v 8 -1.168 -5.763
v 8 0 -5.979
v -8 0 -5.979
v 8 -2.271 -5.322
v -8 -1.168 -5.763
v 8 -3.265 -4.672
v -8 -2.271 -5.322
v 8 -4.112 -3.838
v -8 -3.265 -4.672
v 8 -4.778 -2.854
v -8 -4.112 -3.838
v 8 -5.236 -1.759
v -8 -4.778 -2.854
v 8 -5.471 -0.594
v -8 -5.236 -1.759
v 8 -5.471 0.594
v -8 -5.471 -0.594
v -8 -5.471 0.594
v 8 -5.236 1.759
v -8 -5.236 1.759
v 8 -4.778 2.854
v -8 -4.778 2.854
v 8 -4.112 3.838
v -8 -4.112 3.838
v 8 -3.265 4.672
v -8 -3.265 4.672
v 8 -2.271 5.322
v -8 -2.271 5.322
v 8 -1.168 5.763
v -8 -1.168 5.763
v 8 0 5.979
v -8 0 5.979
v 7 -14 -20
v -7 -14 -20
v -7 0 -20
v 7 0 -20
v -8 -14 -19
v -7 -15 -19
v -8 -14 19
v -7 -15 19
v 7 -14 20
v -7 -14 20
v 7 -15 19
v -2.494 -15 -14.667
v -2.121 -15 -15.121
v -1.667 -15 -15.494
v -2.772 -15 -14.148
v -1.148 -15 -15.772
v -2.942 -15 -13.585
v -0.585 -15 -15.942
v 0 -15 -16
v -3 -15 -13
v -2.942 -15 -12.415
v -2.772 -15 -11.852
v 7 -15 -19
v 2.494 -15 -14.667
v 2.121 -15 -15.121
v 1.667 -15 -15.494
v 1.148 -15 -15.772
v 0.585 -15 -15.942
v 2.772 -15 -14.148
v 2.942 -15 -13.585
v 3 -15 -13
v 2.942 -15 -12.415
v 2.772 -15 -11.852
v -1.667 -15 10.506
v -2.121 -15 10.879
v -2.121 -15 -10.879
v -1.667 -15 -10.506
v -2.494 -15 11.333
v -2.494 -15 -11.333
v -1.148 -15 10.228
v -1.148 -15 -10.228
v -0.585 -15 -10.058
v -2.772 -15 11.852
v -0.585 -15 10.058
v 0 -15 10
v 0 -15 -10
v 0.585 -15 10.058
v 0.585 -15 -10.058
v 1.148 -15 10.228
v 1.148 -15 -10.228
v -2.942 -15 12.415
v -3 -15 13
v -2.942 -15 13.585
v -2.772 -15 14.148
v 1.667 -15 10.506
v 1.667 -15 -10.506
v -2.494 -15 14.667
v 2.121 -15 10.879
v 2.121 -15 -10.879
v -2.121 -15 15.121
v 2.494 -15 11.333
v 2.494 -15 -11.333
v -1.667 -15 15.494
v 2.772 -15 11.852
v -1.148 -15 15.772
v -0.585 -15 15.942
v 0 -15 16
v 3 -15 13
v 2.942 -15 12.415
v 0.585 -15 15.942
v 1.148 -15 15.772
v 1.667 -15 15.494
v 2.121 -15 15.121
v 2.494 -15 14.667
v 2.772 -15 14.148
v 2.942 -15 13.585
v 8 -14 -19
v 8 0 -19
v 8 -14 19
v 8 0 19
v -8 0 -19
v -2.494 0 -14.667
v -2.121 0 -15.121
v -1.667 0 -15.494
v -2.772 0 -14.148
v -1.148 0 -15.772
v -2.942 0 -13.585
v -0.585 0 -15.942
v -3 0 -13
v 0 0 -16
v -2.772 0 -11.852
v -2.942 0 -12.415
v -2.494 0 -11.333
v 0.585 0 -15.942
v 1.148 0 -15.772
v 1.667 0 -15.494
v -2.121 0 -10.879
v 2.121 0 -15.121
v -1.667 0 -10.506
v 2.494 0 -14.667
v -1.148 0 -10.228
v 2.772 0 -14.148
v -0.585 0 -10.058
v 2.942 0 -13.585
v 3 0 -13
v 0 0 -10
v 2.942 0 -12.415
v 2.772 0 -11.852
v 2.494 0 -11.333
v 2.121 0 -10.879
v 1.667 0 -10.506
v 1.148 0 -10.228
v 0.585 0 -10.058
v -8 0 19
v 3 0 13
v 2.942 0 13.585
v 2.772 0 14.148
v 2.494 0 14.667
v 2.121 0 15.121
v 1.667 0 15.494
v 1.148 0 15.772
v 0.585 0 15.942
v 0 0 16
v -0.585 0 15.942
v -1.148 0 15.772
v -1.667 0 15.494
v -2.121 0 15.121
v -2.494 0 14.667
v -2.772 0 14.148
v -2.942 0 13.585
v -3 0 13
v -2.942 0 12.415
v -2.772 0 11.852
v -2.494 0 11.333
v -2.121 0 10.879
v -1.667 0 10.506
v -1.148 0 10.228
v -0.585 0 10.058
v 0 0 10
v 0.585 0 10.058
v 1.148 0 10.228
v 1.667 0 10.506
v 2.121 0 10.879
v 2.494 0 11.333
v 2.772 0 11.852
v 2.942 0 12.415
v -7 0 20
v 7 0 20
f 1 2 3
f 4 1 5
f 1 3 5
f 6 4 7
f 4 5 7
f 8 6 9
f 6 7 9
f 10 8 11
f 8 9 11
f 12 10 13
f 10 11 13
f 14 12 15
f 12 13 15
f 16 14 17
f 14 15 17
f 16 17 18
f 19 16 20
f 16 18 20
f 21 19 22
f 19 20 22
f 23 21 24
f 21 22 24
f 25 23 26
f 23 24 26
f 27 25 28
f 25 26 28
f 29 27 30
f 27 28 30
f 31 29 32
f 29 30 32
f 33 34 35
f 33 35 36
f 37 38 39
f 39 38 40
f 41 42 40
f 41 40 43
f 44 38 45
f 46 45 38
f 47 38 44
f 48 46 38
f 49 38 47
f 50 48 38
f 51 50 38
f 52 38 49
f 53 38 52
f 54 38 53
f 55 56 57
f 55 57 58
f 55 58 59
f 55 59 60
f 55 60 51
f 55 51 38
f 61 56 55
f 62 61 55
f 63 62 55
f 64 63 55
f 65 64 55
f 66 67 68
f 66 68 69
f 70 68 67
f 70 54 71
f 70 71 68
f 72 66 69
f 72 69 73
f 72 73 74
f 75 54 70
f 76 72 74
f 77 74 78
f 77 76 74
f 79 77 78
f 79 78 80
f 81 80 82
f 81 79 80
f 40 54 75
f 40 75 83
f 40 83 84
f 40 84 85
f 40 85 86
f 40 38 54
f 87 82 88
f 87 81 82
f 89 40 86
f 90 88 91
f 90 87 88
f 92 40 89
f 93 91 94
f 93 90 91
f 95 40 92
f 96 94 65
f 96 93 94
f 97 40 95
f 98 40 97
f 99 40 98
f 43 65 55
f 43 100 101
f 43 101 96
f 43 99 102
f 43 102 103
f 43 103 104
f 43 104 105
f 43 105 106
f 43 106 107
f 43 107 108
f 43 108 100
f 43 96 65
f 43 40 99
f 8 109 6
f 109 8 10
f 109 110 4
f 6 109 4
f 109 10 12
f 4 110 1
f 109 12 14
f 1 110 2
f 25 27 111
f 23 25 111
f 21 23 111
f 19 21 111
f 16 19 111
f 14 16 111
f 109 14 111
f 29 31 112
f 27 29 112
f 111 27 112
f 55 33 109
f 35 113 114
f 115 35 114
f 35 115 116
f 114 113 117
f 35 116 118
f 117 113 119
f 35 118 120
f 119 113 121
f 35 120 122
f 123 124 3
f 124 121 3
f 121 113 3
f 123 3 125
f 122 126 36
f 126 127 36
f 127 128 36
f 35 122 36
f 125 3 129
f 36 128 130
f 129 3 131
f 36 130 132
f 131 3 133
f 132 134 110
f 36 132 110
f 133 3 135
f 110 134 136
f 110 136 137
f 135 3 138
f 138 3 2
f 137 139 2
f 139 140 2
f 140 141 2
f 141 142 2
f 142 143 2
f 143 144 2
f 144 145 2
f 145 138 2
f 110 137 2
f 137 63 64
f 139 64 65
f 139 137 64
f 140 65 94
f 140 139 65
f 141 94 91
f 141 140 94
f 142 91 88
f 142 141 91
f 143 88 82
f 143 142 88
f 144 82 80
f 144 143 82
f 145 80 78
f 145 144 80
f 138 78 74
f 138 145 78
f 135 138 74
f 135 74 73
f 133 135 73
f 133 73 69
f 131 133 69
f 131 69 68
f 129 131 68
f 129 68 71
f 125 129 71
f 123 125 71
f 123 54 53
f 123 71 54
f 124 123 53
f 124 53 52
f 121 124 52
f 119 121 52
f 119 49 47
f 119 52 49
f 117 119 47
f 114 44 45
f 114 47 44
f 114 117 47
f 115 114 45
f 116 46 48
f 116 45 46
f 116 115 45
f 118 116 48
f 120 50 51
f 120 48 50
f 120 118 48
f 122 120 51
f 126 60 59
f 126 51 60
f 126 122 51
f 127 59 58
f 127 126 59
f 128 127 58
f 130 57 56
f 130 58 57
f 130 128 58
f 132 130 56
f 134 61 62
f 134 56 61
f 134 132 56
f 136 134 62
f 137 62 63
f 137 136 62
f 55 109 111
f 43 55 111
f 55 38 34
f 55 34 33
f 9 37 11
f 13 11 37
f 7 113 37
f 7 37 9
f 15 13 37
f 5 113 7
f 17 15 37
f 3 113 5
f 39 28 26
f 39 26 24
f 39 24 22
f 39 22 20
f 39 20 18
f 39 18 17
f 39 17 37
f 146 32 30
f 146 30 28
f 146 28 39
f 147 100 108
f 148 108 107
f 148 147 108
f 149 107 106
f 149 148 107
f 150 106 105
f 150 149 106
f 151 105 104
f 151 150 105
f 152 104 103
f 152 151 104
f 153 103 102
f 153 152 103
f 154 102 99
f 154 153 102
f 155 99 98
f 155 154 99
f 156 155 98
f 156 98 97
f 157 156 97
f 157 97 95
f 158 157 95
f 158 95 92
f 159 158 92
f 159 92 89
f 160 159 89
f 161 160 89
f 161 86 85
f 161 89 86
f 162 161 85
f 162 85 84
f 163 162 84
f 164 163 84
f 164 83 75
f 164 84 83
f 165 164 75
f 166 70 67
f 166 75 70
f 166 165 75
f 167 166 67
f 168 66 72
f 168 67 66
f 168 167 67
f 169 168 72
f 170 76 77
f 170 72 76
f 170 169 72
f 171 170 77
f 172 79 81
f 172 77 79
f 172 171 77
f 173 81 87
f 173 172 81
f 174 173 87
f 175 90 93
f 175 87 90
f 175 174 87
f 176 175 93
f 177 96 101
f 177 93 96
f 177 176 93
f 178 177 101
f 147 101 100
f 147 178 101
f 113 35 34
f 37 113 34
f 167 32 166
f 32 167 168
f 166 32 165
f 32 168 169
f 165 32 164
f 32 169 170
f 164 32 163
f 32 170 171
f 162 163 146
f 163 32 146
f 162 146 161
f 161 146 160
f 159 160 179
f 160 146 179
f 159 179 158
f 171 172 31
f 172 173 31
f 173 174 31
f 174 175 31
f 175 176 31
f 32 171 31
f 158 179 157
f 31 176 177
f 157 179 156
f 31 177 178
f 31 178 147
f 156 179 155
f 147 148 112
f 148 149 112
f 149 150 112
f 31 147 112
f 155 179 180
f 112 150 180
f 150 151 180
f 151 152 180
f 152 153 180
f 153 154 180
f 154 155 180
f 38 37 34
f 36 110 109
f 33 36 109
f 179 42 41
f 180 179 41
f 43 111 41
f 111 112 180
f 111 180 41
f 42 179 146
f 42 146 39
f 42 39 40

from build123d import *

# Parameters (mm, degrees)
F0_W     = 16
F0_H     = 40
F1_DEPTH = 15
F2_R     = 6
F3_DEPTH = 16.001
F4_R     = 3
F5_DEPTH = 15.001
F6_SIZE  = 1


with BuildPart() as f1:
    # F0 (on Front) → F1 (new body)
    with BuildSketch(Plane.XZ):
        Rectangle(F0_W, F0_H)
    extrude(amount=F1_DEPTH)

    # F2 (on face) → F3 (cut, through all)
    with BuildSketch(Plane(origin=(-8, 0, 0), x_dir=(0, -1, 0), z_dir=(-1, 0, 0))):
        with Locations((-0.5, 0)):
            Circle(F2_R)
    extrude(amount=-F3_DEPTH, mode=Mode.SUBTRACT)

    # F4 (on Front) → F5 (cut, through all)
    with BuildSketch(Plane.XZ):
        with Locations((0, 13)):
            Circle(F4_R)
        with Locations((0, -13)):
            Circle(F4_R)
    extrude(amount=F5_DEPTH, mode=Mode.SUBTRACT)

    # F6
    f6_edges = [f1.edges().sort_by_distance(p)[0] for p in [
        (8, -7.5, 20),
        (-8, -7.5, 20),
        (8, -7.5, -20),
        (-8, -7.5, -20),
        (-8, -15, 0),
        (0, -15, -20),
        (8, -15, 0),
        (0, -15, 20),
    ]]
    chamfer(f6_edges, length=F6_SIZE)


solid = f1.part
